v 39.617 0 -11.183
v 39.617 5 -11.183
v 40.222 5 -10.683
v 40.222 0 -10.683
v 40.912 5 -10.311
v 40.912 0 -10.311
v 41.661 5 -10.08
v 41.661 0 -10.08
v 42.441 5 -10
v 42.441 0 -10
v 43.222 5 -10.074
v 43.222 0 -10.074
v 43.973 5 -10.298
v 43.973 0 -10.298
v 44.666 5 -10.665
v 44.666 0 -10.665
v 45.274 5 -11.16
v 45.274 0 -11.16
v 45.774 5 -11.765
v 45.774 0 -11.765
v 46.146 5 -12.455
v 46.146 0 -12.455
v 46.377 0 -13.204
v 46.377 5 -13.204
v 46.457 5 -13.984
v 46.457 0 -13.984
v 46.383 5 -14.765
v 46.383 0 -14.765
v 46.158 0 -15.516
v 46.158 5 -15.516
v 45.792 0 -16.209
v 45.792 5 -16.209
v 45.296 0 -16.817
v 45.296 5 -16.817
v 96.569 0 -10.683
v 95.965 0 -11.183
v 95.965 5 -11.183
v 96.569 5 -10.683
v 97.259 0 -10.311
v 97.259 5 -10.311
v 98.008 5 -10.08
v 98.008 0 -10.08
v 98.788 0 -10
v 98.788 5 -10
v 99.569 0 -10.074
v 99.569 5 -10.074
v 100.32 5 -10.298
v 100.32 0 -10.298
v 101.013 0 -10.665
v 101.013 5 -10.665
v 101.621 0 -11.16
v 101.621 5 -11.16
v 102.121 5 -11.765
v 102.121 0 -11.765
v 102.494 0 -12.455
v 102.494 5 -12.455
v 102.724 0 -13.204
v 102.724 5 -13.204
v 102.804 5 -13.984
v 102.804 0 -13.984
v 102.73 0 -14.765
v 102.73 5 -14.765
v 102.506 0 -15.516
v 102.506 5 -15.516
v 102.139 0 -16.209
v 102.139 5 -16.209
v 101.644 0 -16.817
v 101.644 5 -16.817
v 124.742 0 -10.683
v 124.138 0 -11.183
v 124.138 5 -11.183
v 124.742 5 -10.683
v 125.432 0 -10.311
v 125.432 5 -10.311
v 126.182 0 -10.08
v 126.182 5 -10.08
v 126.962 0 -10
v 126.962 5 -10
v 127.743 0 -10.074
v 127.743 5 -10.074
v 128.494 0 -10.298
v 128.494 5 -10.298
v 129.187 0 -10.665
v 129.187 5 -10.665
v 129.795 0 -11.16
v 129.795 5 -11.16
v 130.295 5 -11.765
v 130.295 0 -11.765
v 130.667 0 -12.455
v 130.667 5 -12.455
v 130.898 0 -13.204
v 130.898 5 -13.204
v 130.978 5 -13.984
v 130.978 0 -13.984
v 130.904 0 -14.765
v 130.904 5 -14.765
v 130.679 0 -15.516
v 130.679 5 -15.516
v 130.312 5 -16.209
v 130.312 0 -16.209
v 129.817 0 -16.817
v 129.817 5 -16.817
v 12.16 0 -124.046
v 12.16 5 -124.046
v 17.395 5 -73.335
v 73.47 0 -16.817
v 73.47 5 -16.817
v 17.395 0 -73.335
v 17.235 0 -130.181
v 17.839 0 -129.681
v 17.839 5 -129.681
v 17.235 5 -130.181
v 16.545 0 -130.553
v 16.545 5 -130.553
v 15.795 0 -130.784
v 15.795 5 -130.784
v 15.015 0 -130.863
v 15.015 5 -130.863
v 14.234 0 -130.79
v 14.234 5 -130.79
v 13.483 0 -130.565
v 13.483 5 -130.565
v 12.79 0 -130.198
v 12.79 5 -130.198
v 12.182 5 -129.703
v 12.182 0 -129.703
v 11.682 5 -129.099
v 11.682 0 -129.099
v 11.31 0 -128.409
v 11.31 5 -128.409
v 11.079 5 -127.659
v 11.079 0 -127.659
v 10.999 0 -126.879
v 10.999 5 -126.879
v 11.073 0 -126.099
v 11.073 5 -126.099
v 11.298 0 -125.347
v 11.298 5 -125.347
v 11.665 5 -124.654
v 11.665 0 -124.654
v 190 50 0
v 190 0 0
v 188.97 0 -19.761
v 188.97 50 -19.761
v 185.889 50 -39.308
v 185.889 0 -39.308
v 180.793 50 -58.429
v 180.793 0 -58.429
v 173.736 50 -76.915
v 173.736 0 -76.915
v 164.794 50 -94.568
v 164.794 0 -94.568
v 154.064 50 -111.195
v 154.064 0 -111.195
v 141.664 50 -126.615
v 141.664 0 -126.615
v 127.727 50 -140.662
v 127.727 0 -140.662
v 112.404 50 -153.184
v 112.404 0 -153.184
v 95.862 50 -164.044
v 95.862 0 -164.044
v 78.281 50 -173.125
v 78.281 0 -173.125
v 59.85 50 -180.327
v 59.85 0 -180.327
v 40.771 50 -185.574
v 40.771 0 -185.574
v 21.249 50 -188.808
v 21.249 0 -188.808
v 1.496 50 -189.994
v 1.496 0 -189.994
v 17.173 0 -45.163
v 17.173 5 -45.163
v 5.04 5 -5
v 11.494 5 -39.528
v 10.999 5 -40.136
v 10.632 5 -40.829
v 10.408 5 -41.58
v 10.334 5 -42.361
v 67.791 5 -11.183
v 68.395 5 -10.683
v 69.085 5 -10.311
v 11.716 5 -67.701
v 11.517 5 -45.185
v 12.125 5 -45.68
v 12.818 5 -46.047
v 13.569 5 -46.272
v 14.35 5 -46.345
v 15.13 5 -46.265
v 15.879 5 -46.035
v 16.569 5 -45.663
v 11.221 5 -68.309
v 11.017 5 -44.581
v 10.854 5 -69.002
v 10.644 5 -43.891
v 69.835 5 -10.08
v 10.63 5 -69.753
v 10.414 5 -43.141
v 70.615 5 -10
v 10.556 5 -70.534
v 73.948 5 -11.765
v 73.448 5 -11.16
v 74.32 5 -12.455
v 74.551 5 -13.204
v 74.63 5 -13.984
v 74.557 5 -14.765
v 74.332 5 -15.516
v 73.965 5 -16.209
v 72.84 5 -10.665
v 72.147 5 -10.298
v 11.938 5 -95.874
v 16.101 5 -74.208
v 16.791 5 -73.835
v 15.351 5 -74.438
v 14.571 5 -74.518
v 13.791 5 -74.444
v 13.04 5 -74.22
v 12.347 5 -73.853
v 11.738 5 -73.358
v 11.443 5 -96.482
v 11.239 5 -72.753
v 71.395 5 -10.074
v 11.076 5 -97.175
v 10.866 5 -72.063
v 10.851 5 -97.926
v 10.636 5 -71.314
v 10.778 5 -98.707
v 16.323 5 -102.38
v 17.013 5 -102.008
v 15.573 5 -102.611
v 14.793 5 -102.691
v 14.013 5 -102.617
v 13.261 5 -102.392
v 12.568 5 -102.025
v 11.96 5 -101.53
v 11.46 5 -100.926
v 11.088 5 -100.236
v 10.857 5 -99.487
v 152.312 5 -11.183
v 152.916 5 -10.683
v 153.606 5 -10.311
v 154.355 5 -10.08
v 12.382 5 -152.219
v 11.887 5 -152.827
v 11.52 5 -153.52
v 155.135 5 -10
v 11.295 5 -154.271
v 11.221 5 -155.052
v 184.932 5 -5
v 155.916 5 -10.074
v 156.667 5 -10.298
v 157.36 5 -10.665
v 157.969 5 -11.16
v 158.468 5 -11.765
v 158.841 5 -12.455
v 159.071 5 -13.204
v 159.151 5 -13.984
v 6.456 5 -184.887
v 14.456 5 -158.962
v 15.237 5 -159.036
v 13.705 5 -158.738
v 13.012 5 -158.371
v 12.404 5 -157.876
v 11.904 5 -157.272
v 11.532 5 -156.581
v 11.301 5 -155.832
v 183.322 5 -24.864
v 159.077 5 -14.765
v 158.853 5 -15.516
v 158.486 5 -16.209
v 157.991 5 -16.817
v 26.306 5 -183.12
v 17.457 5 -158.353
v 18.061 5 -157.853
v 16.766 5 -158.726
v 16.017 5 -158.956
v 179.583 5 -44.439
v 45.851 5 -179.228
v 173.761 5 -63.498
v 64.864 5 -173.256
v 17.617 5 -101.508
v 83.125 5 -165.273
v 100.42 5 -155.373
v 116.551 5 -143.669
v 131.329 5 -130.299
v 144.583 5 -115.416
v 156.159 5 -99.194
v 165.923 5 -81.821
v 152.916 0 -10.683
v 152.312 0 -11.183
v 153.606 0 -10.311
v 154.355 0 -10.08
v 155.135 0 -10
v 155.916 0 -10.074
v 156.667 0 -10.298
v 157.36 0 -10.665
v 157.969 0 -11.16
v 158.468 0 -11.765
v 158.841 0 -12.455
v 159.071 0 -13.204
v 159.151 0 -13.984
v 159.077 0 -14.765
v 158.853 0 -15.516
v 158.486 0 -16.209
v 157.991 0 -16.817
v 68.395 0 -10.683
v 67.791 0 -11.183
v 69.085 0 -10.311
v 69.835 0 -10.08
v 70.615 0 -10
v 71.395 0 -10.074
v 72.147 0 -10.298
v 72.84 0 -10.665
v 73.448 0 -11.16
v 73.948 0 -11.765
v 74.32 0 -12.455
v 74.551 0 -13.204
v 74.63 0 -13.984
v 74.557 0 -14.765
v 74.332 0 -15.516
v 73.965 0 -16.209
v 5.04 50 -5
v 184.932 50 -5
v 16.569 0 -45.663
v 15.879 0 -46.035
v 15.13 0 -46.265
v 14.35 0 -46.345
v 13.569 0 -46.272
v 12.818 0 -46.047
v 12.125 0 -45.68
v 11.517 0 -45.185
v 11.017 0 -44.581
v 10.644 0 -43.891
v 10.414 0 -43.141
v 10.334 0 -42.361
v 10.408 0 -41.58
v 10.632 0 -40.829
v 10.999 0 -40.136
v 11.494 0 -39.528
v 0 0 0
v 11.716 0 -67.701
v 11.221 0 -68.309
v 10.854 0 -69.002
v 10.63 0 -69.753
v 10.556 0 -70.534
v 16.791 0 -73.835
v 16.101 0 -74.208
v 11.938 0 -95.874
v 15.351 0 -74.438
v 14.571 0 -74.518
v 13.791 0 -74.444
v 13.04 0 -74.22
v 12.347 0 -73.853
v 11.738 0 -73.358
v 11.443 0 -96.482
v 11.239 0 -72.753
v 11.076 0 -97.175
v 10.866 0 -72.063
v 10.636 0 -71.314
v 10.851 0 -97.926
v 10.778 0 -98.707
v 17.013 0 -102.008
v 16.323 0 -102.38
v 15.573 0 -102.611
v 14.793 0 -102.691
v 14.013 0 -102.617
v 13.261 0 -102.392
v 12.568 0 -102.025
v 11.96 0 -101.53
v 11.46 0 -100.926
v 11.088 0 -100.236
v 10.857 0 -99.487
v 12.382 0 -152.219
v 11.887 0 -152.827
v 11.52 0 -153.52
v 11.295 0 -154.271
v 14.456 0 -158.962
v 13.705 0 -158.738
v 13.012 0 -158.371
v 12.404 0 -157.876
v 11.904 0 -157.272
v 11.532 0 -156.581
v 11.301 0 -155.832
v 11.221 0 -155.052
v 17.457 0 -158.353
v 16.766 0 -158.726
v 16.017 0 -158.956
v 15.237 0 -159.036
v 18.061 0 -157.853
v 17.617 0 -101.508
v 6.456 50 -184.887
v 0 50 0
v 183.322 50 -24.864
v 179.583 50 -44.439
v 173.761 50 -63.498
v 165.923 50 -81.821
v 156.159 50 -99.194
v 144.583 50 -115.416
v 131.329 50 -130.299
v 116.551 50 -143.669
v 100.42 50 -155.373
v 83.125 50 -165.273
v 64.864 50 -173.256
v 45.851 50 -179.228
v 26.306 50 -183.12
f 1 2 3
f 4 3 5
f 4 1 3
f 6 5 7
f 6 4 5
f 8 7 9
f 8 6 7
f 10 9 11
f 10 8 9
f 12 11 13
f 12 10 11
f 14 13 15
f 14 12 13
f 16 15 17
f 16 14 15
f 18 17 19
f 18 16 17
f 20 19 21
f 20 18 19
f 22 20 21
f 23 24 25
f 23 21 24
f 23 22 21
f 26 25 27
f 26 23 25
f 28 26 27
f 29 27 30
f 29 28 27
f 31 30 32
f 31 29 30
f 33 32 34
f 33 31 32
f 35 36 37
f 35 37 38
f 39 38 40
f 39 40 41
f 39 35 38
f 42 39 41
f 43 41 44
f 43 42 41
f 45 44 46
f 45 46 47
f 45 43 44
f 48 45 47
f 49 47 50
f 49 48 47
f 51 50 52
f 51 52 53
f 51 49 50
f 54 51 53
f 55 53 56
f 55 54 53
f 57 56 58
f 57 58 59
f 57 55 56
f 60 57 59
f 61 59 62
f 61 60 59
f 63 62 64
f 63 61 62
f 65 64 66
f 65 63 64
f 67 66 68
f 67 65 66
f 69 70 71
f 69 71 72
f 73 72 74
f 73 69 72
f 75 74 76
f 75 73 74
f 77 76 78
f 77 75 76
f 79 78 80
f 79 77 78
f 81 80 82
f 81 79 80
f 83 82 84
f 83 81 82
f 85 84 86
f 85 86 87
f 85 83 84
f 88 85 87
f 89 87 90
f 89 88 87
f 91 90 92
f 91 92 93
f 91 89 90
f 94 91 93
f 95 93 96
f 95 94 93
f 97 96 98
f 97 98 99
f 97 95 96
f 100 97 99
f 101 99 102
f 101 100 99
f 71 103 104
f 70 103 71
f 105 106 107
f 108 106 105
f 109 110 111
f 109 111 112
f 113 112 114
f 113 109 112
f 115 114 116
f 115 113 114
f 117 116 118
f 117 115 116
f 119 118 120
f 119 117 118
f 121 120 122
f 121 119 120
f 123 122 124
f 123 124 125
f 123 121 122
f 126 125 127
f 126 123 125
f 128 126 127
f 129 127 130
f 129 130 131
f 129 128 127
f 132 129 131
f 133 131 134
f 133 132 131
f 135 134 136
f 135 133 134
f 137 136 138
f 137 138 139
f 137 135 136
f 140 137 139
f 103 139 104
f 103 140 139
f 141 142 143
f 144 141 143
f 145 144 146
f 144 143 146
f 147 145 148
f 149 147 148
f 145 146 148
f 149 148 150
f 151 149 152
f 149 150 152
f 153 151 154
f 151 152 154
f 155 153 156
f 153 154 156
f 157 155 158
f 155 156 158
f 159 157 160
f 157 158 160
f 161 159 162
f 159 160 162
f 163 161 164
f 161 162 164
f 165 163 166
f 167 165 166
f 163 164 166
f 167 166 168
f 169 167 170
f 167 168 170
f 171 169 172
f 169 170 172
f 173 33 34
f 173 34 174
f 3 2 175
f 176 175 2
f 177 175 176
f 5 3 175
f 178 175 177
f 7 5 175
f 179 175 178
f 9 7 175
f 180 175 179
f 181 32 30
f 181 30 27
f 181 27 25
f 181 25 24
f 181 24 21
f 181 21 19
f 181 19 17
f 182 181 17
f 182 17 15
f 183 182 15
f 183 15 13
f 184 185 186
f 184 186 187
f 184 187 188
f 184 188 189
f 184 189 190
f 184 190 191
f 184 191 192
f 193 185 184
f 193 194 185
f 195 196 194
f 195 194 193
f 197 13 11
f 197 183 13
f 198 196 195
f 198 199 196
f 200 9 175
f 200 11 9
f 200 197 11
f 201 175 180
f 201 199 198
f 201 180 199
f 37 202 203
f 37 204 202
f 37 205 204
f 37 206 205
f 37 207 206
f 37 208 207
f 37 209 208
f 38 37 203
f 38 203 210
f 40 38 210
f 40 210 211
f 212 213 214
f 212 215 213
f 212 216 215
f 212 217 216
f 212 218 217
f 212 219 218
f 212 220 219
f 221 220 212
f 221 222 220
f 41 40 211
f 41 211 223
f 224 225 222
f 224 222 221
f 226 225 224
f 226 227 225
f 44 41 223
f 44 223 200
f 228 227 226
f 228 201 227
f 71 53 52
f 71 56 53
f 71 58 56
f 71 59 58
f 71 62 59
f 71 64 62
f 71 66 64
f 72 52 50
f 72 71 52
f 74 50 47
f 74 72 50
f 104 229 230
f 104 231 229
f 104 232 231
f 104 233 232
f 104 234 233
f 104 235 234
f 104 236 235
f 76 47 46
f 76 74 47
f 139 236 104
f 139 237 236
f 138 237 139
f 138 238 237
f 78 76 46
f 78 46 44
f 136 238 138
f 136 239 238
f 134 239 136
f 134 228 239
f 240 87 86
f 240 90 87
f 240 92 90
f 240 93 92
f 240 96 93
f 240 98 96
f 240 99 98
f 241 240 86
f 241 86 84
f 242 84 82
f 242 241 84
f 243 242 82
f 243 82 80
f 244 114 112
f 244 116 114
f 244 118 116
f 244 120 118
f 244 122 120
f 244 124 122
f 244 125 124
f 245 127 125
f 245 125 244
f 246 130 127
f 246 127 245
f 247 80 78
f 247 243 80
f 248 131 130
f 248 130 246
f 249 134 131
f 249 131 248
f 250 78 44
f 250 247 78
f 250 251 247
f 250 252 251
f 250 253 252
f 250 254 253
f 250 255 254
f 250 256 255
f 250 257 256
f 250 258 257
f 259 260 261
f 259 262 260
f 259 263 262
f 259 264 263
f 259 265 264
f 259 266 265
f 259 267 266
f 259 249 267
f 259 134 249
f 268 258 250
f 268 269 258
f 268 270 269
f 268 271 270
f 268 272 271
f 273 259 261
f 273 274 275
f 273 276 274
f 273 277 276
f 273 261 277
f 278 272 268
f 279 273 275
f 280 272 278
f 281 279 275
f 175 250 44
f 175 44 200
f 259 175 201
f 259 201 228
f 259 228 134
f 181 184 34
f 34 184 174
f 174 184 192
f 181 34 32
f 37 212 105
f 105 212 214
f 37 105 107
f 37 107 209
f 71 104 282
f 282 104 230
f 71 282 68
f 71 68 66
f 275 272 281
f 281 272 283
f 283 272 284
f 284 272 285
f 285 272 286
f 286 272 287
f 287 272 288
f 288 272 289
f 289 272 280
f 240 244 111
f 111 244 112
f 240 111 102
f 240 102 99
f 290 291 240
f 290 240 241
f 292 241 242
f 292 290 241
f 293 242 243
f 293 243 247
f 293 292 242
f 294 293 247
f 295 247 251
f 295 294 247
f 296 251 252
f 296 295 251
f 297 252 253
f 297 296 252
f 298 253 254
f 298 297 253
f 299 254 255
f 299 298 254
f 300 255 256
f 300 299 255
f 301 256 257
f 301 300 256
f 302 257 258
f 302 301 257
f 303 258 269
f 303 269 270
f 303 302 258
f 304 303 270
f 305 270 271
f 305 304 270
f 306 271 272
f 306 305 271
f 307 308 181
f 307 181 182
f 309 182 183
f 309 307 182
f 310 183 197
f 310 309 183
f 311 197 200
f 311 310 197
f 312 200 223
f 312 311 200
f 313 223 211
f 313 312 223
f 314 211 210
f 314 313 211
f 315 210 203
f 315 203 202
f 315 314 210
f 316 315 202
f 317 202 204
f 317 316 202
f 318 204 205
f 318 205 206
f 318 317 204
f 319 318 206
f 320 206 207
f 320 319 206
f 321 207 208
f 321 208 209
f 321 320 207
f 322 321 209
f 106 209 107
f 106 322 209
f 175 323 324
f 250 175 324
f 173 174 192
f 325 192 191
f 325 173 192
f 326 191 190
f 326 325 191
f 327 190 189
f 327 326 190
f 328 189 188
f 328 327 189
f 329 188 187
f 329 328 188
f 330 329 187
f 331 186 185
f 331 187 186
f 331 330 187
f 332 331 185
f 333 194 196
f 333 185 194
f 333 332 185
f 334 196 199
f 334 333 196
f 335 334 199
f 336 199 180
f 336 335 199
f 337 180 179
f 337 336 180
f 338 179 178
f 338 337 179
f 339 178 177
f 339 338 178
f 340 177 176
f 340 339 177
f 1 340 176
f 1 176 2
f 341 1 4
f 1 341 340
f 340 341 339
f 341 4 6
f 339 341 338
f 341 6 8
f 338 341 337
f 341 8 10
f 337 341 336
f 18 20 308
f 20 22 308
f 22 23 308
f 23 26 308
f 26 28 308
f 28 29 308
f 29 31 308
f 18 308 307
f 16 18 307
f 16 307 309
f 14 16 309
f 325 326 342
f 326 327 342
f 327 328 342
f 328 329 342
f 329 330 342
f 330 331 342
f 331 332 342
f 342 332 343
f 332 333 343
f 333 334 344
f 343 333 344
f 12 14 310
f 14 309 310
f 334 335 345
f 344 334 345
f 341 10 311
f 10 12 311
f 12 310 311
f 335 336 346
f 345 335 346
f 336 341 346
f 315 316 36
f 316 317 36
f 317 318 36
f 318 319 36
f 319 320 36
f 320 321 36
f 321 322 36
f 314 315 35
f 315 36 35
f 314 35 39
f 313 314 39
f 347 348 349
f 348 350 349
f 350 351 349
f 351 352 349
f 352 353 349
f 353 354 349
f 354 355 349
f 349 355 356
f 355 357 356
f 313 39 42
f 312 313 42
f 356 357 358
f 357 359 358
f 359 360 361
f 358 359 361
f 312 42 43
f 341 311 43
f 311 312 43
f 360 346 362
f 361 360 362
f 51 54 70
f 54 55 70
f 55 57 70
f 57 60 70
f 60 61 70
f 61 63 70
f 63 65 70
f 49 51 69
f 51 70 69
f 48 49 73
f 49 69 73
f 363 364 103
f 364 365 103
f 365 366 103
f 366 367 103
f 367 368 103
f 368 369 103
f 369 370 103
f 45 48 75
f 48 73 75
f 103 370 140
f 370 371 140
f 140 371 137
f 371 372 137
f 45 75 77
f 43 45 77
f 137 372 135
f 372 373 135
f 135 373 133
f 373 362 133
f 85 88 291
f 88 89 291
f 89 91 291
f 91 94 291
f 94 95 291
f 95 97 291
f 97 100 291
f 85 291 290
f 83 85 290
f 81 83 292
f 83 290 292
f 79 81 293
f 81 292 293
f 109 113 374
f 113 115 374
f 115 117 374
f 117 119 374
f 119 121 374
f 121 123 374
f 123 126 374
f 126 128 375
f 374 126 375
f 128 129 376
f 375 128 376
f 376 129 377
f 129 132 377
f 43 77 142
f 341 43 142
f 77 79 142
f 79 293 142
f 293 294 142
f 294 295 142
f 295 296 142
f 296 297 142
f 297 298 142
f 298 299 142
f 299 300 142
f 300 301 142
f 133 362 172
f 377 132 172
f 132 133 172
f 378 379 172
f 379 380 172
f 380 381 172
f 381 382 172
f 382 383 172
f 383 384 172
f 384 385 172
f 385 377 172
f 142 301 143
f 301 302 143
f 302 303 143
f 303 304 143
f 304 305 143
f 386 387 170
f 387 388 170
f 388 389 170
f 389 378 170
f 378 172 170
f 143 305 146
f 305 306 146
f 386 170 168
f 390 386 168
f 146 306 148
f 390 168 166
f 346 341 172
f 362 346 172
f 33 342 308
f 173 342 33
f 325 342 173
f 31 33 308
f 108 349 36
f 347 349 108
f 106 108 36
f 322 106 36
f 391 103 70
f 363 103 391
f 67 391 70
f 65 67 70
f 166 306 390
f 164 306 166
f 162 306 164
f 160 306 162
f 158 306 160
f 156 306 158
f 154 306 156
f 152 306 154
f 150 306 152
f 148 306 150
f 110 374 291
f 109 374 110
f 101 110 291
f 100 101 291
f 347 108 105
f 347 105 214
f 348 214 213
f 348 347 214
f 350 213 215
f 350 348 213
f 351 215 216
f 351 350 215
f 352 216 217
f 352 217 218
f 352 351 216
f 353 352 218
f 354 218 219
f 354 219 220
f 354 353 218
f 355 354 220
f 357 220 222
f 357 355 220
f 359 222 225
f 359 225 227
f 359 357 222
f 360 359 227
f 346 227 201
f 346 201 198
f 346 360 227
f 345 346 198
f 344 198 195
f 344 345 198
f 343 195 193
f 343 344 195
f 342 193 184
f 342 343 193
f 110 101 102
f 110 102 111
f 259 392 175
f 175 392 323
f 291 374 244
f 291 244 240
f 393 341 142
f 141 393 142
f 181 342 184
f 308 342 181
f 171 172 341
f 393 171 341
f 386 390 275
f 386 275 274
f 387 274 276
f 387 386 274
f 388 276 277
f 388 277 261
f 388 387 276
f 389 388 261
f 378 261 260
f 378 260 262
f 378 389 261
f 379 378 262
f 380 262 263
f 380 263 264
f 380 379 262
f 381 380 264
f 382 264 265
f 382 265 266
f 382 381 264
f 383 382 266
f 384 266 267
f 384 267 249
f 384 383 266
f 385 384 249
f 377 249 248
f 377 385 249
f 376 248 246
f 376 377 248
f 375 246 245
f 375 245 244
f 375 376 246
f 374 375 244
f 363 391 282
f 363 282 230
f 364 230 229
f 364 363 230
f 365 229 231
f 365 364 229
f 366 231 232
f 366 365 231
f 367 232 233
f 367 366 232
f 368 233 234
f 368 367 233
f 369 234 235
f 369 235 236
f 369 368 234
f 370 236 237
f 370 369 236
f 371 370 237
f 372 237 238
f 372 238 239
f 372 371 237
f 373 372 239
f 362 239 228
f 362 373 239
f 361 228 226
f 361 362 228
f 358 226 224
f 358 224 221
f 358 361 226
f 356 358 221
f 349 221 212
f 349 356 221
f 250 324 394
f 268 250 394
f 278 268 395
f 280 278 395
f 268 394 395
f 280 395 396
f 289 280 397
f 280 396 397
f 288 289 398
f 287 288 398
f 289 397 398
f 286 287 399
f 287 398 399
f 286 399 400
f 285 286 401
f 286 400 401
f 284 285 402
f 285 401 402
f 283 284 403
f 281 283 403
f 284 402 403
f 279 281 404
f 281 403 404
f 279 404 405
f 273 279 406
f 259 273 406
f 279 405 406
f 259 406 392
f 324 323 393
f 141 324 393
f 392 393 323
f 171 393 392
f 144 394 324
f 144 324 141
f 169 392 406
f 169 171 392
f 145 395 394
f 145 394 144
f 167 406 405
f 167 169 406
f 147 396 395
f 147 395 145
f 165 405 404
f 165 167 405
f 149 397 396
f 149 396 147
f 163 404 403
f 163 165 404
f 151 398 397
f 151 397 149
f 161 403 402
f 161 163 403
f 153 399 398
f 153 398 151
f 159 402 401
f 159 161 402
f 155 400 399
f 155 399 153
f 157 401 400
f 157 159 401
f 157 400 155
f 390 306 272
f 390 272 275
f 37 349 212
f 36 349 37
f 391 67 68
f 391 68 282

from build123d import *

# Parameters (mm, degrees)
EXTRUDE_1_DEPTH        = 50
CUT_EXTRUDE_1_DEPTH    = 45
CUT_EXTRUDE_3_DEPTH    = 274.308913017
PATTERN_LINEAR_3_DEPTH = 5


# Read off the part's stored shape, not the designer's step: 阵列(线性)3
with BuildPart() as part:
    # 草图1 → 凸台-拉伸1 (new body)
    with BuildSketch(Plane(origin=(0, 0, 0), x_dir=(1, 0, 0), z_dir=(0, 1, 0))):
        with BuildLine():
            Line((1.496016616, 189.994110262), (0, 0))
            Line((0, 0), (190, 0))
            ThreePointArc((190, 0), (134.878173099, 133.820321407), (1.496016616, 189.994110262))
        make_face()
    extrude(amount=EXTRUDE_1_DEPTH)

    # 草图2 → 切除-拉伸1 (cut)
    with BuildSketch(Plane(origin=(0, 50, 0), x_dir=(1, 0, 0), z_dir=(0, 1, 0))):
        with BuildLine():
            Line((5.039525077, 5), (184.932420089, 5))
            ThreePointArc((184.932420089, 5), (131.328747491, 130.298734001), (6.455960656, 184.887318581))
            Line((6.455960656, 184.887318581), (5.039525077, 5))
        make_face()
    extrude(amount=-CUT_EXTRUDE_1_DEPTH, mode=Mode.SUBTRACT)

    # 草图3 → 切除-拉伸3 (cut, through all)
    with BuildSketch(Plane.XZ):
        with BuildLine():
            Line((11.494321842, -39.528128563), (39.617406911, -11.182730076))
            ThreePointArc((39.617406911, -11.182730076), (45.274217322, -11.160459514), (45.296487884, -16.817269924))
            Line((45.296487884, -16.817269924), (17.173402815, -45.162668411))
            ThreePointArc((17.173402815, -45.162668411), (11.516592404, -45.184938973), (11.494321842, -39.528128563))
        make_face()
    extrude(amount=-CUT_EXTRUDE_3_DEPTH, mode=Mode.SUBTRACT)

    # 阵列(线性)3 outline → 阵列(线性)3 (cut)
    with BuildSketch(Plane(origin=(0, 0, 0), x_dir=(1, 0, 0), z_dir=(0, 1, 0))):
        with BuildLine():
            ThreePointArc((17.395235092, 73.335367655), (11.738424681, 73.357638217), (11.71615412, 67.700827806))
            Line((11.71615412, 67.700827806), (67.790979496, 11.182730076))
            ThreePointArc((67.790979496, 11.182730076), (73.447789906, 11.160459514), (73.470060469, 16.817269924))
            Line((73.470060469, 16.817269924), (17.395235092, 73.335367655))
        make_face()
        with BuildLine():
            ThreePointArc((18.060731925, 157.853465386), (12.403921514, 157.875735948), (12.381650952, 152.218925537))
            Line((12.381650952, 152.218925537), (152.311697253, 11.182730076))
            ThreePointArc((152.311697253, 11.182730076), (157.968507663, 11.160459514), (157.990778225, 16.817269924))
            Line((157.990778225, 16.817269924), (18.060731925, 157.853465386))
        make_face()
        with BuildLine():
            ThreePointArc((17.61706737, 101.508066899), (11.960256959, 101.530337461), (11.937986397, 95.87352705))
            Line((11.937986397, 95.87352705), (95.964552082, 11.182730076))
            ThreePointArc((95.964552082, 11.182730076), (101.621362492, 11.160459514), (101.643633054, 16.817269924))
            Line((101.643633054, 16.817269924), (17.61706737, 101.508066899))
        make_face()
        with BuildLine():
            ThreePointArc((17.838899648, 129.680766142), (12.182089237, 129.703036704), (12.159818675, 124.046226293))
            Line((12.159818675, 124.046226293), (124.138124667, 11.182730076))
            ThreePointArc((124.138124667, 11.182730076), (129.794935077, 11.160459514), (129.81720564, 16.817269924))
            Line((129.81720564, 16.817269924), (17.838899648, 129.680766142))
        make_face()
    extrude(amount=PATTERN_LINEAR_3_DEPTH, mode=Mode.SUBTRACT)


solid = part.part
